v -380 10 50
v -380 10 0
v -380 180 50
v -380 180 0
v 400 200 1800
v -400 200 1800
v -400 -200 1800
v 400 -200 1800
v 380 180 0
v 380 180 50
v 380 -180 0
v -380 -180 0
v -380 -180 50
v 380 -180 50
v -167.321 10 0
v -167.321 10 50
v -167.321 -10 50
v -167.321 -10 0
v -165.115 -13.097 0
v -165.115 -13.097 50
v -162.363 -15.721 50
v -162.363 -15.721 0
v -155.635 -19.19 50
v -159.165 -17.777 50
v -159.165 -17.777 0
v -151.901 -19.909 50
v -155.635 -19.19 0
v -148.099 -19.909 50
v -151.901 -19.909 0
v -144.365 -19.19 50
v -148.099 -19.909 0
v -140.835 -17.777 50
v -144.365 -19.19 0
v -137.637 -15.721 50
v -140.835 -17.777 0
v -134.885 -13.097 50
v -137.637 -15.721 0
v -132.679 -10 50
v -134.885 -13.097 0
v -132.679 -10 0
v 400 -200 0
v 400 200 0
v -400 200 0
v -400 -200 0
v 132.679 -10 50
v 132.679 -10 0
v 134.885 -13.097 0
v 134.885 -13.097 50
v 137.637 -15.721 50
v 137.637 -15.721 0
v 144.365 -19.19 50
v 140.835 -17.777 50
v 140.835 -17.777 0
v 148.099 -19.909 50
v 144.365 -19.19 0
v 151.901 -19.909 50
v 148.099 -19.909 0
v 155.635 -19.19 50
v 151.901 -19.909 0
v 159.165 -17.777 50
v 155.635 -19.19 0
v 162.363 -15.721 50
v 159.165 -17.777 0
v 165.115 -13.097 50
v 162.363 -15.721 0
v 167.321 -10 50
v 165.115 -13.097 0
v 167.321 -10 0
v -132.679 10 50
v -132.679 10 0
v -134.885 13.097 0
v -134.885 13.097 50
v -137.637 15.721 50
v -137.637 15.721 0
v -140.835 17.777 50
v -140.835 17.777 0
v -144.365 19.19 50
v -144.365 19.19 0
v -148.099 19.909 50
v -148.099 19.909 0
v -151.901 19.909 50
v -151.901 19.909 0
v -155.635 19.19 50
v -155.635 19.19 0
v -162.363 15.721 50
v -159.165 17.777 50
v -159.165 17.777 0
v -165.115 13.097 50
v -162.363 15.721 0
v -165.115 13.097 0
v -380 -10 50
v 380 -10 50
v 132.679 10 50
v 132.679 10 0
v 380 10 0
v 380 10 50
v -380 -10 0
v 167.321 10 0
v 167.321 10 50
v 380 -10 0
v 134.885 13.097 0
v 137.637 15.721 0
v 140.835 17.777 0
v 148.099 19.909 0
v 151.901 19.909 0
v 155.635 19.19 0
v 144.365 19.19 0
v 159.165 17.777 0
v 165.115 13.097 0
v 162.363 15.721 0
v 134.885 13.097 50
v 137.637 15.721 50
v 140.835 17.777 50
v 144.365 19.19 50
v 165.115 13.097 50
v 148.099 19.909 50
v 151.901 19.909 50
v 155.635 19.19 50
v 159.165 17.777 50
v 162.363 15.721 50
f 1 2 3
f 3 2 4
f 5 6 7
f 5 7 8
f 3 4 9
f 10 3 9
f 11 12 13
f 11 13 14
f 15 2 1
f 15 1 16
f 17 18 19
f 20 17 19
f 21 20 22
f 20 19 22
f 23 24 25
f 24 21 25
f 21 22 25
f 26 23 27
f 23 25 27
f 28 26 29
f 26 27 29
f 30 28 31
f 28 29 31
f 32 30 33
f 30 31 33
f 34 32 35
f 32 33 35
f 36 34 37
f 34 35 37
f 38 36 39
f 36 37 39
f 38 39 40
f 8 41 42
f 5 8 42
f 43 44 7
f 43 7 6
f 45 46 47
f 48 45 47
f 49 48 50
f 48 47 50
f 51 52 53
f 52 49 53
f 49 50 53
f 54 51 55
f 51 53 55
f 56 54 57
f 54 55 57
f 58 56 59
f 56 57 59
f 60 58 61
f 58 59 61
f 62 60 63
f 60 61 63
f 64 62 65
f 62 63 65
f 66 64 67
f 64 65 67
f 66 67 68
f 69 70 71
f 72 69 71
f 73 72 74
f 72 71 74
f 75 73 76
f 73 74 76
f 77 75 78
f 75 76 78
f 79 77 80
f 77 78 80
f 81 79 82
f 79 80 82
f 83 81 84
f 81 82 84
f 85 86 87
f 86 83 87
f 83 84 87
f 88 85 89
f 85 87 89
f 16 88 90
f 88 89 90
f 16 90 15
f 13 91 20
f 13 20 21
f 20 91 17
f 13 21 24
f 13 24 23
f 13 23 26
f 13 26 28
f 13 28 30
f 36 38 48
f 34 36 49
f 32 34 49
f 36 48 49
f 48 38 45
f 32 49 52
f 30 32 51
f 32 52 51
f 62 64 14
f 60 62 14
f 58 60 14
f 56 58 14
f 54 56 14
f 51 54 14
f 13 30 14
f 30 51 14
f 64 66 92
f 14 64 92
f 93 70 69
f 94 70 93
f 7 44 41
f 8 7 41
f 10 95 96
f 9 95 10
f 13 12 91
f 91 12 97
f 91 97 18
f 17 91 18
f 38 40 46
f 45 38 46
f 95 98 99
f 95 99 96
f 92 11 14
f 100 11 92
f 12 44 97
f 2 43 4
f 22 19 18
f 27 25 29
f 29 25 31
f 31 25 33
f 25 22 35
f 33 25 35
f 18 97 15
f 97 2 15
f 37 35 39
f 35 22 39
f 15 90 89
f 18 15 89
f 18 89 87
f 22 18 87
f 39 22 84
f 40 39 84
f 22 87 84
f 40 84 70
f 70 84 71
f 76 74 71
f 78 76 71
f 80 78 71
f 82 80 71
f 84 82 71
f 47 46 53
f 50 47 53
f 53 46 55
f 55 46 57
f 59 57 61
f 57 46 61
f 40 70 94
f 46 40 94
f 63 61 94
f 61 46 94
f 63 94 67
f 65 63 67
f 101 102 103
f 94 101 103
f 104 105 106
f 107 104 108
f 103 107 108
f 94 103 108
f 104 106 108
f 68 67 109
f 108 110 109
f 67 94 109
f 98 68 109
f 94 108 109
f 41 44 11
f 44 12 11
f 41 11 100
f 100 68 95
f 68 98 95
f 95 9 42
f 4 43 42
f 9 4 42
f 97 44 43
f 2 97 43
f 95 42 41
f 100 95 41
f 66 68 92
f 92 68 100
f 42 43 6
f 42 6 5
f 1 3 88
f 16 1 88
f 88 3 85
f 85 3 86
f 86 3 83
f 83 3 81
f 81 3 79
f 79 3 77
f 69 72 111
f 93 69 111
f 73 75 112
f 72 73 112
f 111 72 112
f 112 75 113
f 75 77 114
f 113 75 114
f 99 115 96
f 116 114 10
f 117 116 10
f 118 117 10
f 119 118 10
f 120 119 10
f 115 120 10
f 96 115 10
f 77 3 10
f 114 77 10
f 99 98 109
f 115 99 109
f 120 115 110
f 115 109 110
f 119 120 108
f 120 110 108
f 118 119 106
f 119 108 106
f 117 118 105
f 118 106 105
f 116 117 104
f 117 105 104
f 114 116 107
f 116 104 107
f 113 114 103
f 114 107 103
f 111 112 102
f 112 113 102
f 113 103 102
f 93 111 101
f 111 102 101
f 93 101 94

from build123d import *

# Parameters (mm, degrees)
SKETCH_1_W          = 800
SKETCH_1_H          = 400
EXTRUDE_1_DEPTH     = 1800
SKETCH_2_W          = 760
SKETCH_2_H          = 360
CUT_EXTRUDE_2_DEPTH = 50
SKETCH_3_W          = 380
SKETCH_3_H          = 20
EXTRUDE_2_DEPTH     = 1700
SKETCH_4_W          = 380
SKETCH_4_H          = 20
EXTRUDE_3_DEPTH     = 1700
SKETCH_5_W          = 760
SKETCH_5_H          = 20
EXTRUDE_4_DEPTH     = 300
SKETCH_6_R          = 20
EXTRUDE_5_DEPTH     = 80
SKETCH_7_R          = 20
EXTRUDE_6_DEPTH     = 80


with BuildPart() as part:
    # 草图1 → 凸台-拉伸1 (new body)
    with BuildSketch(Plane.XY):
        Rectangle(SKETCH_1_W, SKETCH_1_H)
    extrude(amount=EXTRUDE_1_DEPTH)

    # 草图2 → 切除-拉伸2 (cut)
    with BuildSketch(Plane.XY):
        Rectangle(SKETCH_2_W, SKETCH_2_H)
    extrude(amount=CUT_EXTRUDE_2_DEPTH, mode=Mode.SUBTRACT)

    # 草图3 → 凸台-拉伸2 (add)
    with BuildSketch(Plane.XY):
        with Locations((-190, 0)):
            Rectangle(SKETCH_3_W, SKETCH_3_H)
    extrude(amount=EXTRUDE_2_DEPTH)

    # 草图4 → 凸台-拉伸3 (add)
    with BuildSketch(Plane.XY):
        with Locations((190, 0)):
            Rectangle(SKETCH_4_W, SKETCH_4_H)
    extrude(amount=EXTRUDE_3_DEPTH)

    # 草图5 → 凸台-拉伸4 (add)
    with BuildSketch(Plane.XY):
        Rectangle(SKETCH_5_W, SKETCH_5_H)
    extrude(amount=EXTRUDE_4_DEPTH)

    # 草图6 → 凸台-拉伸5 (add)
    with BuildSketch(Plane.XY):
        with Locations((-150, 0)):
            Circle(SKETCH_6_R)
    extrude(amount=EXTRUDE_5_DEPTH)

    # 草图7 → 凸台-拉伸6 (add)
    with BuildSketch(Plane.XY):
        with Locations((150, 0)):
            Circle(SKETCH_7_R)
    extrude(amount=EXTRUDE_6_DEPTH)


solid = part.part
